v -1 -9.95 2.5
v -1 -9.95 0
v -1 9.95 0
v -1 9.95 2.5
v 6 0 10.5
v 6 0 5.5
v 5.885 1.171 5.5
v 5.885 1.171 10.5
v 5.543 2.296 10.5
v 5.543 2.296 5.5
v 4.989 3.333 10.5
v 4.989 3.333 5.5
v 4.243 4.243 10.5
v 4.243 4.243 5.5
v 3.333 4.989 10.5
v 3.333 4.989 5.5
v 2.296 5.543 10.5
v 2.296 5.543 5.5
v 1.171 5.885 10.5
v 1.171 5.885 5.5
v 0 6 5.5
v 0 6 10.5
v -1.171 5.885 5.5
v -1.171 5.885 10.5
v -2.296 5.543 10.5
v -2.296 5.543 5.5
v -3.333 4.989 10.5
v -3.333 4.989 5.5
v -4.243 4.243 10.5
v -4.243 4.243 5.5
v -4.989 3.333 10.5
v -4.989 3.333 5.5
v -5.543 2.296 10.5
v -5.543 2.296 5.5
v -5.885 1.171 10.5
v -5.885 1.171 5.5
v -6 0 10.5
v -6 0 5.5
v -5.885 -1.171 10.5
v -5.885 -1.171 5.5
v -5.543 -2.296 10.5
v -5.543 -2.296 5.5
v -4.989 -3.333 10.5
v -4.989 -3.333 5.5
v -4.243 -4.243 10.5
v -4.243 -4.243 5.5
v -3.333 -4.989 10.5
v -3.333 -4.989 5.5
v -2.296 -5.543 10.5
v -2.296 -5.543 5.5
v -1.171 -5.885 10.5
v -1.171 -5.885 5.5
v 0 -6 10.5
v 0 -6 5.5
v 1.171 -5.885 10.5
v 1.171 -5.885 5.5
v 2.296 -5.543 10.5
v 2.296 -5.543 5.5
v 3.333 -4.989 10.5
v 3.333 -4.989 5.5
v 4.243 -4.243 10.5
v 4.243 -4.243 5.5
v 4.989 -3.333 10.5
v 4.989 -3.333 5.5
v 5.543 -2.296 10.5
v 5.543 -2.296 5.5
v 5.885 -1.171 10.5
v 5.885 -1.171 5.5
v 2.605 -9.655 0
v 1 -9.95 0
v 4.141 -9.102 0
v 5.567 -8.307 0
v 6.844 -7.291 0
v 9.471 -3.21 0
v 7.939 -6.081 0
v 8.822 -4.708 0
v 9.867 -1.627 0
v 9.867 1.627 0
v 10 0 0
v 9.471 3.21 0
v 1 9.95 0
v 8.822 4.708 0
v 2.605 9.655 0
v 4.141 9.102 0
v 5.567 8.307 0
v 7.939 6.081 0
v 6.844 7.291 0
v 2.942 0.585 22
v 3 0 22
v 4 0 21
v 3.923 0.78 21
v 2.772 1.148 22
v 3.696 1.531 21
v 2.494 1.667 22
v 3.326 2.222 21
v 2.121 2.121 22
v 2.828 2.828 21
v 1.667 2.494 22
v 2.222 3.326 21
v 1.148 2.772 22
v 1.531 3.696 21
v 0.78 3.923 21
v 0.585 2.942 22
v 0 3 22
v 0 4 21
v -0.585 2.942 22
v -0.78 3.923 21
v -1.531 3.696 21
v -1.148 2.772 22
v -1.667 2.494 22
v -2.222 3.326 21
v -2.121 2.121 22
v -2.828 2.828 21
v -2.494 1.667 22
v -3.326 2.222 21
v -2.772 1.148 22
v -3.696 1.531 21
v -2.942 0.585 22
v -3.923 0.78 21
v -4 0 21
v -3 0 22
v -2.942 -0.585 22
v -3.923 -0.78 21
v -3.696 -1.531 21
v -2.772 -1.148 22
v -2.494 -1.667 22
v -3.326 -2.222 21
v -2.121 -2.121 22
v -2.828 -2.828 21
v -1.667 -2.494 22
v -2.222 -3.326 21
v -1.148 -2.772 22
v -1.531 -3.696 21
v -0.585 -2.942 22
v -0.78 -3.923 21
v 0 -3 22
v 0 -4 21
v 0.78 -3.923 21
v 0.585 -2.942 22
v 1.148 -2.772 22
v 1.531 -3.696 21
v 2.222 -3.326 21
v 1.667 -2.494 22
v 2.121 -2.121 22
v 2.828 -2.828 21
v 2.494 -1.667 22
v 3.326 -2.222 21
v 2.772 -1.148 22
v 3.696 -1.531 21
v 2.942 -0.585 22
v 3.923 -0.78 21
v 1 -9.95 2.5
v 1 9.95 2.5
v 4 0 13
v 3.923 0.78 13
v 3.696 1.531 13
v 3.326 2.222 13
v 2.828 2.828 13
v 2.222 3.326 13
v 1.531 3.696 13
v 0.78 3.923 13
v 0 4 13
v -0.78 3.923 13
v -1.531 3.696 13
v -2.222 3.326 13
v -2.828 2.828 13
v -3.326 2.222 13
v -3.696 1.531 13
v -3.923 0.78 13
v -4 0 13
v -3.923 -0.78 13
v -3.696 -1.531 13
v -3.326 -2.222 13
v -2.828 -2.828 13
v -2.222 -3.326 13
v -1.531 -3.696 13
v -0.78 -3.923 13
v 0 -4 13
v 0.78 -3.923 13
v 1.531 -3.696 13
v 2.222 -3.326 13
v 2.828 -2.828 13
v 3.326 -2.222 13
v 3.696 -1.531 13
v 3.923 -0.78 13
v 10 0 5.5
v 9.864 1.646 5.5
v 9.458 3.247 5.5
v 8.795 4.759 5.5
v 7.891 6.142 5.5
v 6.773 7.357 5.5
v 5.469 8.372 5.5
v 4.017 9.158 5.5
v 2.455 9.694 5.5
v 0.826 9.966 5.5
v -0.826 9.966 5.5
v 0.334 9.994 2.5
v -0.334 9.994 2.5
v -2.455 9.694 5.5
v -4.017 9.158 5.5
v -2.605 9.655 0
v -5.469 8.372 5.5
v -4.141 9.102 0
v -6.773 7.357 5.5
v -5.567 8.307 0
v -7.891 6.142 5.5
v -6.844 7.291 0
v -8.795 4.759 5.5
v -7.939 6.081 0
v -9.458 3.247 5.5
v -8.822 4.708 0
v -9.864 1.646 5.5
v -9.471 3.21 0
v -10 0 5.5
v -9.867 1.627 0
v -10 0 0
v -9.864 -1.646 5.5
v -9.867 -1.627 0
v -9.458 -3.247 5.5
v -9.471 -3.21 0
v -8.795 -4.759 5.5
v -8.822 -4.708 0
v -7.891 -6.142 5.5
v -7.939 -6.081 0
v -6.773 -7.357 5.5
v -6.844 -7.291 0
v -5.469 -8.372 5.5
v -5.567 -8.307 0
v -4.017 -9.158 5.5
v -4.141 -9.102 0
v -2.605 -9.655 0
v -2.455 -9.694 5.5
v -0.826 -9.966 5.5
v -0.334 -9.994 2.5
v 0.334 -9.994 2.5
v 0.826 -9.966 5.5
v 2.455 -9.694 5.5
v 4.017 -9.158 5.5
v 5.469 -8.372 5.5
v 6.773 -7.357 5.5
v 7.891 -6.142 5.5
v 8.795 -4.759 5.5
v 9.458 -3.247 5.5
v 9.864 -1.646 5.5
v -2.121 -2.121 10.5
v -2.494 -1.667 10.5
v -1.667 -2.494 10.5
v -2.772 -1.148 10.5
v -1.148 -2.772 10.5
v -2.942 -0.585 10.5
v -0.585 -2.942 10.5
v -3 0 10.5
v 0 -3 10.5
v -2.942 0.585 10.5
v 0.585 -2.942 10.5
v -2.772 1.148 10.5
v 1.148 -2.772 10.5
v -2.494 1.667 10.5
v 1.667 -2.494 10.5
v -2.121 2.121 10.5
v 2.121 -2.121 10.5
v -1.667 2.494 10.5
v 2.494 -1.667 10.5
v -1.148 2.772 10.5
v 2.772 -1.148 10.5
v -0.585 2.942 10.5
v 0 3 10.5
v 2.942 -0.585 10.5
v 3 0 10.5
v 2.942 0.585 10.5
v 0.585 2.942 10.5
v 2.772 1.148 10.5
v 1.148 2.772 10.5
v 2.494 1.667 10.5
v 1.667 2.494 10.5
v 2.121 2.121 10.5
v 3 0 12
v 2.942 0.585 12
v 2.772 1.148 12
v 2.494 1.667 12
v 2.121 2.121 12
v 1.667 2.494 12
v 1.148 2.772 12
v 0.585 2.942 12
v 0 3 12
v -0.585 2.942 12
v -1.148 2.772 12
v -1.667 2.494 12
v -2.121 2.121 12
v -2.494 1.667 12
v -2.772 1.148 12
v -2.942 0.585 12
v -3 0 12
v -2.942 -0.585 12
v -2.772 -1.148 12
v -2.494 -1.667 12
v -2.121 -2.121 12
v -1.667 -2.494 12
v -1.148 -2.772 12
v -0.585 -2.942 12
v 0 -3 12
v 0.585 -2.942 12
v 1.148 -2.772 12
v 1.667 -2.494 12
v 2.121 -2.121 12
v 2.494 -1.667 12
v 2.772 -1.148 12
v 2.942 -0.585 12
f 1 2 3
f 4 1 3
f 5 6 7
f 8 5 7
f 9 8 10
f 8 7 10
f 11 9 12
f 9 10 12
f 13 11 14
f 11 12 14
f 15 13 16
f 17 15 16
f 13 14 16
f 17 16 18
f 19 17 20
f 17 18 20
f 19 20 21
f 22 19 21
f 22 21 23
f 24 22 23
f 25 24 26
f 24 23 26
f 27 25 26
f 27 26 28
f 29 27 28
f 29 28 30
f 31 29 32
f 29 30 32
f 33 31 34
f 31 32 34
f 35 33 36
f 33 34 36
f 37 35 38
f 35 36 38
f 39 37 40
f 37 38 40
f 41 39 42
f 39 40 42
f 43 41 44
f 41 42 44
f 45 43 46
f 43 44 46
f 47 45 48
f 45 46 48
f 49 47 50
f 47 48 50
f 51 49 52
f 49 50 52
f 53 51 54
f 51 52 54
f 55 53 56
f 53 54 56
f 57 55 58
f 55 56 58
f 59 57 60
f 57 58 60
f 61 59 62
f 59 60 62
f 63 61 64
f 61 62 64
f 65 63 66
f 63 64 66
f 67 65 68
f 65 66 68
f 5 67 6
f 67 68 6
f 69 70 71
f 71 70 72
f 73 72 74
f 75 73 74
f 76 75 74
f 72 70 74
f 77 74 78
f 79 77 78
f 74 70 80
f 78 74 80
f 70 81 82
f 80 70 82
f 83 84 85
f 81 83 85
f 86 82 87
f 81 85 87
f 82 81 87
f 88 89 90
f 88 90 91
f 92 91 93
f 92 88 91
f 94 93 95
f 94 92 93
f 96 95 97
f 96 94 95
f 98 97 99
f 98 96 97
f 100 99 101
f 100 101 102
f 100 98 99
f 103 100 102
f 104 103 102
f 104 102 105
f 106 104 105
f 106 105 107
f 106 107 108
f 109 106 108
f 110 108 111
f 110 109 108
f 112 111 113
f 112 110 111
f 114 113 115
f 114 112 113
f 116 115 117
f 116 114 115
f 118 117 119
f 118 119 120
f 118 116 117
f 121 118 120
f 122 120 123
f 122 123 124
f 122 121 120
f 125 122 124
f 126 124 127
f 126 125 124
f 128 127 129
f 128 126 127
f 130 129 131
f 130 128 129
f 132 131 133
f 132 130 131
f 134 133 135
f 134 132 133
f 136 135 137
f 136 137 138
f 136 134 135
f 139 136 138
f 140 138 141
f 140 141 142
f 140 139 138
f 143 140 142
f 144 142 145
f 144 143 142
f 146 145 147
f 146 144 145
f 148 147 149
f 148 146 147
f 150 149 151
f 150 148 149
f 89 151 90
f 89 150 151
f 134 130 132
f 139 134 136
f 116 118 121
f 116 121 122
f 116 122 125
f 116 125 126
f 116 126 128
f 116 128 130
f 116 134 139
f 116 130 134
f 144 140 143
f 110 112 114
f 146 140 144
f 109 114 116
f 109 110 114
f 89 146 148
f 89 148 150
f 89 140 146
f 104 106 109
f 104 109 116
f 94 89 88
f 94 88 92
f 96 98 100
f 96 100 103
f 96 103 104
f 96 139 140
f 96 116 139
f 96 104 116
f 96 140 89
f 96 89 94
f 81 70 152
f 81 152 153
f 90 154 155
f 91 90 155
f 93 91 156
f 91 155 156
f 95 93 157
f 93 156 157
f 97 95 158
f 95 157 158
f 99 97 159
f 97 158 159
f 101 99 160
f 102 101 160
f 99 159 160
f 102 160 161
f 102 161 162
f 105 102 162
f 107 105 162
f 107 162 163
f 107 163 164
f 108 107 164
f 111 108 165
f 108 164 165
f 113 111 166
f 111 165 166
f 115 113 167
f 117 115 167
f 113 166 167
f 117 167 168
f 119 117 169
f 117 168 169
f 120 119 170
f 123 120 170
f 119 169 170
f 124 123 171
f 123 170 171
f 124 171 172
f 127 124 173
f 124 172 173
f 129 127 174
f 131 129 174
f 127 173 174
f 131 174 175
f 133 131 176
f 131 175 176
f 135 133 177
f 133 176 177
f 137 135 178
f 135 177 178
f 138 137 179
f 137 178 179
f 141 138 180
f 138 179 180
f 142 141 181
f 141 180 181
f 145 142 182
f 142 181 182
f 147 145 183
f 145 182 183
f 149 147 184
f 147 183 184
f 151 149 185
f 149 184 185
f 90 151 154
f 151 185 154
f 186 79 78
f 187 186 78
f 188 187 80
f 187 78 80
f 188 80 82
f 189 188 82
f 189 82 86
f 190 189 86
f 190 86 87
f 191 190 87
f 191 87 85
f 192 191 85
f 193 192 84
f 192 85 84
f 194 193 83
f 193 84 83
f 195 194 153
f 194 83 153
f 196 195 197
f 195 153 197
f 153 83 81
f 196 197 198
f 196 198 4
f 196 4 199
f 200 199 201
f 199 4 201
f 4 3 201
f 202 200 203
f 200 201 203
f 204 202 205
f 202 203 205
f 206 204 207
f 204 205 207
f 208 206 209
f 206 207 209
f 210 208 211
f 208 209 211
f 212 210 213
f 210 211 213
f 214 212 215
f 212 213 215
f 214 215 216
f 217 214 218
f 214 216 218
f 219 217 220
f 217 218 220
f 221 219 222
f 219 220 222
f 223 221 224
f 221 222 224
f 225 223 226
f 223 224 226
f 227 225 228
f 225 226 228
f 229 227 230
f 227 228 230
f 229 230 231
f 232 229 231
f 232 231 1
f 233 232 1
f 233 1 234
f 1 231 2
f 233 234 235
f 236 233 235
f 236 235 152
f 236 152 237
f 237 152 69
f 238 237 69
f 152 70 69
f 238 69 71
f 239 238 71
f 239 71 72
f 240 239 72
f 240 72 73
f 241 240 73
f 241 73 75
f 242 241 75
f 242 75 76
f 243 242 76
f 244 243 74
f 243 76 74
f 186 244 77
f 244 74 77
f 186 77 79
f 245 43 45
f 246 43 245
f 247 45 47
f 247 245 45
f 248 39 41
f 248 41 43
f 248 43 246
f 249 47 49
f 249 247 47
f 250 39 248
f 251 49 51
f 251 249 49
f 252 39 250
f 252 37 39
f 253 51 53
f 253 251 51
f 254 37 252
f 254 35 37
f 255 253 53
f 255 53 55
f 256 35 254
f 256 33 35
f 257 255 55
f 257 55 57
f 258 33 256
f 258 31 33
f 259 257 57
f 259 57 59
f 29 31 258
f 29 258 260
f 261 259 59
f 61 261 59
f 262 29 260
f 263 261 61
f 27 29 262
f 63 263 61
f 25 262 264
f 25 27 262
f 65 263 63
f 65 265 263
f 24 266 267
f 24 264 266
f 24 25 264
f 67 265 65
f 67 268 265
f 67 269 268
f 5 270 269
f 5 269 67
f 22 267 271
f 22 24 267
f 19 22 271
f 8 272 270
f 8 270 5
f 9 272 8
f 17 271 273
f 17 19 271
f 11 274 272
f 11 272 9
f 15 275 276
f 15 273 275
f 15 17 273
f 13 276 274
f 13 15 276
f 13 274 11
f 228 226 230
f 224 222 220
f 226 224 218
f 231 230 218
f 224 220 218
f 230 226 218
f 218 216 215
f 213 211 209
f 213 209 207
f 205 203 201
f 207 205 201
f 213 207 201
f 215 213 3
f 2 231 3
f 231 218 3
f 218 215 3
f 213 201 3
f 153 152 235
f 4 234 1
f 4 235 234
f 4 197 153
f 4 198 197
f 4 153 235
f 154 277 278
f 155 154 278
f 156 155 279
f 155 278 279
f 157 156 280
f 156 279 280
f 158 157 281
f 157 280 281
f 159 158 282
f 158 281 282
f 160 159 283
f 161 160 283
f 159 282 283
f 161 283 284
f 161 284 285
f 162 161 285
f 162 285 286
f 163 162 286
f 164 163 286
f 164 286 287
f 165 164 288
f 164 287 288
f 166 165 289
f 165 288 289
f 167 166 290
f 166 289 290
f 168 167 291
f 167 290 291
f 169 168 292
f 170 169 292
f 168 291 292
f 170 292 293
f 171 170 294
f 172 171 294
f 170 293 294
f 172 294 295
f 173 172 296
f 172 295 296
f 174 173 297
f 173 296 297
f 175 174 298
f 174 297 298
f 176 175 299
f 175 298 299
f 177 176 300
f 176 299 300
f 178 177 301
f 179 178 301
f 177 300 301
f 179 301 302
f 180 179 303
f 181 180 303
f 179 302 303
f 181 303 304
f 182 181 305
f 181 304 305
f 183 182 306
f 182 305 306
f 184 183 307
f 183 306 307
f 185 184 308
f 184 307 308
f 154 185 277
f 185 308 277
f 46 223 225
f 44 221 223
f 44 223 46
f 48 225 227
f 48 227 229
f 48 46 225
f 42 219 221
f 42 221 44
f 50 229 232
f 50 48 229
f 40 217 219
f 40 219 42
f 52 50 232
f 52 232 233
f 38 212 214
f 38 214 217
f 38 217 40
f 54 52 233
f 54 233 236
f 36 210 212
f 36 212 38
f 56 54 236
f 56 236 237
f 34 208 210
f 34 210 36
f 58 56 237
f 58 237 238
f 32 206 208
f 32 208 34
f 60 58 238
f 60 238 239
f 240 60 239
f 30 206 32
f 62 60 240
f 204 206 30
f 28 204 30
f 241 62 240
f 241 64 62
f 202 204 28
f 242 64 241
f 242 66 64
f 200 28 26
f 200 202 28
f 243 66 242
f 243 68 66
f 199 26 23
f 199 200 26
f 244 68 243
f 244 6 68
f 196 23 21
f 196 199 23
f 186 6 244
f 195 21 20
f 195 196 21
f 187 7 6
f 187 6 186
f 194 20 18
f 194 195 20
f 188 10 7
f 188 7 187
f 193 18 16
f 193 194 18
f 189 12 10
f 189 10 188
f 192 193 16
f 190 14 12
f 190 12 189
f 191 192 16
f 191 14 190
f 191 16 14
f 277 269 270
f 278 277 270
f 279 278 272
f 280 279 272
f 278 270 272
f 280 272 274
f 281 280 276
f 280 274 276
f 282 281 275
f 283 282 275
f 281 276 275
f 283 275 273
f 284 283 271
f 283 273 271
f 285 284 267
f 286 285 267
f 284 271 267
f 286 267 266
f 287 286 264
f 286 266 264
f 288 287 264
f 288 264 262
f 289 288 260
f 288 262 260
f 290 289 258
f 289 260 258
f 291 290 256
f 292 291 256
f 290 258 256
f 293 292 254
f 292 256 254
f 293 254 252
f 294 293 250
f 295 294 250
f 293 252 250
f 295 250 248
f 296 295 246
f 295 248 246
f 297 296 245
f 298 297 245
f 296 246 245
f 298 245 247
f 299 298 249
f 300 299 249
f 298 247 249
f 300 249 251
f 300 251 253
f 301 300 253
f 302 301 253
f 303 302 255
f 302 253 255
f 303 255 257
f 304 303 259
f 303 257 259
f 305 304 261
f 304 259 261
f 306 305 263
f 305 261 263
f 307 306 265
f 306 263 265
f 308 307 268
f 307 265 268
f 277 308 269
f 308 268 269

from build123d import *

# Parameters (mm, degrees)
SKETCH_1_R          = 10
EXTRUDE_1_DEPTH     = 5.5
SKETCH_2_R          = 6
EXTRUDE_2_DEPTH     = 5
SKETCH_3_R          = 3
EXTRUDE_3_DEPTH     = 1.5
SKETCH_4_R          = 4
EXTRUDE_4_DEPTH     = 10
CHAMFER_1_SIZE      = 1
SKETCH_5_W          = 2
SKETCH_5_H          = 20
CUT_EXTRUDE_1_DEPTH = 2.5


with BuildPart() as part:
    # 草图1 → 凸台-拉伸1 (new body)
    with BuildSketch(Plane.XY):
        Circle(SKETCH_1_R)
    extrude(amount=EXTRUDE_1_DEPTH)

    # 草图2 → 凸台-拉伸2 (add)
    with BuildSketch(Plane.XY.offset(5.5)):
        Circle(SKETCH_2_R)
    extrude(amount=EXTRUDE_2_DEPTH)

    # 草图3 → 凸台-拉伸3 (add)
    with BuildSketch(Plane.XY.offset(10.5)):
        Circle(SKETCH_3_R)
    extrude(amount=EXTRUDE_3_DEPTH)

    # 草图4 → 凸台-拉伸4 (add)
    with BuildSketch(Plane.XY.offset(12)):
        Circle(SKETCH_4_R)
    extrude(amount=EXTRUDE_4_DEPTH)

    # 倒角1
    chamfer_1_edges = [part.edges().sort_by_distance(p)[0] for p in [
        (-4, 0, 12),
        (-4, 0, 22),
    ]]
    chamfer(chamfer_1_edges, length=CHAMFER_1_SIZE - 0.0001)  # a hair under: the kernel refuses the full size

    # 草图5 → 切除-拉伸-薄壁1 (cut)
    with BuildSketch(Plane(origin=(0, 0, 0), x_dir=(-1, 0, 0), z_dir=(0, 0, -1))):
        Rectangle(SKETCH_5_W, SKETCH_5_H)
    extrude(amount=-CUT_EXTRUDE_1_DEPTH, mode=Mode.SUBTRACT)


solid = part.part
